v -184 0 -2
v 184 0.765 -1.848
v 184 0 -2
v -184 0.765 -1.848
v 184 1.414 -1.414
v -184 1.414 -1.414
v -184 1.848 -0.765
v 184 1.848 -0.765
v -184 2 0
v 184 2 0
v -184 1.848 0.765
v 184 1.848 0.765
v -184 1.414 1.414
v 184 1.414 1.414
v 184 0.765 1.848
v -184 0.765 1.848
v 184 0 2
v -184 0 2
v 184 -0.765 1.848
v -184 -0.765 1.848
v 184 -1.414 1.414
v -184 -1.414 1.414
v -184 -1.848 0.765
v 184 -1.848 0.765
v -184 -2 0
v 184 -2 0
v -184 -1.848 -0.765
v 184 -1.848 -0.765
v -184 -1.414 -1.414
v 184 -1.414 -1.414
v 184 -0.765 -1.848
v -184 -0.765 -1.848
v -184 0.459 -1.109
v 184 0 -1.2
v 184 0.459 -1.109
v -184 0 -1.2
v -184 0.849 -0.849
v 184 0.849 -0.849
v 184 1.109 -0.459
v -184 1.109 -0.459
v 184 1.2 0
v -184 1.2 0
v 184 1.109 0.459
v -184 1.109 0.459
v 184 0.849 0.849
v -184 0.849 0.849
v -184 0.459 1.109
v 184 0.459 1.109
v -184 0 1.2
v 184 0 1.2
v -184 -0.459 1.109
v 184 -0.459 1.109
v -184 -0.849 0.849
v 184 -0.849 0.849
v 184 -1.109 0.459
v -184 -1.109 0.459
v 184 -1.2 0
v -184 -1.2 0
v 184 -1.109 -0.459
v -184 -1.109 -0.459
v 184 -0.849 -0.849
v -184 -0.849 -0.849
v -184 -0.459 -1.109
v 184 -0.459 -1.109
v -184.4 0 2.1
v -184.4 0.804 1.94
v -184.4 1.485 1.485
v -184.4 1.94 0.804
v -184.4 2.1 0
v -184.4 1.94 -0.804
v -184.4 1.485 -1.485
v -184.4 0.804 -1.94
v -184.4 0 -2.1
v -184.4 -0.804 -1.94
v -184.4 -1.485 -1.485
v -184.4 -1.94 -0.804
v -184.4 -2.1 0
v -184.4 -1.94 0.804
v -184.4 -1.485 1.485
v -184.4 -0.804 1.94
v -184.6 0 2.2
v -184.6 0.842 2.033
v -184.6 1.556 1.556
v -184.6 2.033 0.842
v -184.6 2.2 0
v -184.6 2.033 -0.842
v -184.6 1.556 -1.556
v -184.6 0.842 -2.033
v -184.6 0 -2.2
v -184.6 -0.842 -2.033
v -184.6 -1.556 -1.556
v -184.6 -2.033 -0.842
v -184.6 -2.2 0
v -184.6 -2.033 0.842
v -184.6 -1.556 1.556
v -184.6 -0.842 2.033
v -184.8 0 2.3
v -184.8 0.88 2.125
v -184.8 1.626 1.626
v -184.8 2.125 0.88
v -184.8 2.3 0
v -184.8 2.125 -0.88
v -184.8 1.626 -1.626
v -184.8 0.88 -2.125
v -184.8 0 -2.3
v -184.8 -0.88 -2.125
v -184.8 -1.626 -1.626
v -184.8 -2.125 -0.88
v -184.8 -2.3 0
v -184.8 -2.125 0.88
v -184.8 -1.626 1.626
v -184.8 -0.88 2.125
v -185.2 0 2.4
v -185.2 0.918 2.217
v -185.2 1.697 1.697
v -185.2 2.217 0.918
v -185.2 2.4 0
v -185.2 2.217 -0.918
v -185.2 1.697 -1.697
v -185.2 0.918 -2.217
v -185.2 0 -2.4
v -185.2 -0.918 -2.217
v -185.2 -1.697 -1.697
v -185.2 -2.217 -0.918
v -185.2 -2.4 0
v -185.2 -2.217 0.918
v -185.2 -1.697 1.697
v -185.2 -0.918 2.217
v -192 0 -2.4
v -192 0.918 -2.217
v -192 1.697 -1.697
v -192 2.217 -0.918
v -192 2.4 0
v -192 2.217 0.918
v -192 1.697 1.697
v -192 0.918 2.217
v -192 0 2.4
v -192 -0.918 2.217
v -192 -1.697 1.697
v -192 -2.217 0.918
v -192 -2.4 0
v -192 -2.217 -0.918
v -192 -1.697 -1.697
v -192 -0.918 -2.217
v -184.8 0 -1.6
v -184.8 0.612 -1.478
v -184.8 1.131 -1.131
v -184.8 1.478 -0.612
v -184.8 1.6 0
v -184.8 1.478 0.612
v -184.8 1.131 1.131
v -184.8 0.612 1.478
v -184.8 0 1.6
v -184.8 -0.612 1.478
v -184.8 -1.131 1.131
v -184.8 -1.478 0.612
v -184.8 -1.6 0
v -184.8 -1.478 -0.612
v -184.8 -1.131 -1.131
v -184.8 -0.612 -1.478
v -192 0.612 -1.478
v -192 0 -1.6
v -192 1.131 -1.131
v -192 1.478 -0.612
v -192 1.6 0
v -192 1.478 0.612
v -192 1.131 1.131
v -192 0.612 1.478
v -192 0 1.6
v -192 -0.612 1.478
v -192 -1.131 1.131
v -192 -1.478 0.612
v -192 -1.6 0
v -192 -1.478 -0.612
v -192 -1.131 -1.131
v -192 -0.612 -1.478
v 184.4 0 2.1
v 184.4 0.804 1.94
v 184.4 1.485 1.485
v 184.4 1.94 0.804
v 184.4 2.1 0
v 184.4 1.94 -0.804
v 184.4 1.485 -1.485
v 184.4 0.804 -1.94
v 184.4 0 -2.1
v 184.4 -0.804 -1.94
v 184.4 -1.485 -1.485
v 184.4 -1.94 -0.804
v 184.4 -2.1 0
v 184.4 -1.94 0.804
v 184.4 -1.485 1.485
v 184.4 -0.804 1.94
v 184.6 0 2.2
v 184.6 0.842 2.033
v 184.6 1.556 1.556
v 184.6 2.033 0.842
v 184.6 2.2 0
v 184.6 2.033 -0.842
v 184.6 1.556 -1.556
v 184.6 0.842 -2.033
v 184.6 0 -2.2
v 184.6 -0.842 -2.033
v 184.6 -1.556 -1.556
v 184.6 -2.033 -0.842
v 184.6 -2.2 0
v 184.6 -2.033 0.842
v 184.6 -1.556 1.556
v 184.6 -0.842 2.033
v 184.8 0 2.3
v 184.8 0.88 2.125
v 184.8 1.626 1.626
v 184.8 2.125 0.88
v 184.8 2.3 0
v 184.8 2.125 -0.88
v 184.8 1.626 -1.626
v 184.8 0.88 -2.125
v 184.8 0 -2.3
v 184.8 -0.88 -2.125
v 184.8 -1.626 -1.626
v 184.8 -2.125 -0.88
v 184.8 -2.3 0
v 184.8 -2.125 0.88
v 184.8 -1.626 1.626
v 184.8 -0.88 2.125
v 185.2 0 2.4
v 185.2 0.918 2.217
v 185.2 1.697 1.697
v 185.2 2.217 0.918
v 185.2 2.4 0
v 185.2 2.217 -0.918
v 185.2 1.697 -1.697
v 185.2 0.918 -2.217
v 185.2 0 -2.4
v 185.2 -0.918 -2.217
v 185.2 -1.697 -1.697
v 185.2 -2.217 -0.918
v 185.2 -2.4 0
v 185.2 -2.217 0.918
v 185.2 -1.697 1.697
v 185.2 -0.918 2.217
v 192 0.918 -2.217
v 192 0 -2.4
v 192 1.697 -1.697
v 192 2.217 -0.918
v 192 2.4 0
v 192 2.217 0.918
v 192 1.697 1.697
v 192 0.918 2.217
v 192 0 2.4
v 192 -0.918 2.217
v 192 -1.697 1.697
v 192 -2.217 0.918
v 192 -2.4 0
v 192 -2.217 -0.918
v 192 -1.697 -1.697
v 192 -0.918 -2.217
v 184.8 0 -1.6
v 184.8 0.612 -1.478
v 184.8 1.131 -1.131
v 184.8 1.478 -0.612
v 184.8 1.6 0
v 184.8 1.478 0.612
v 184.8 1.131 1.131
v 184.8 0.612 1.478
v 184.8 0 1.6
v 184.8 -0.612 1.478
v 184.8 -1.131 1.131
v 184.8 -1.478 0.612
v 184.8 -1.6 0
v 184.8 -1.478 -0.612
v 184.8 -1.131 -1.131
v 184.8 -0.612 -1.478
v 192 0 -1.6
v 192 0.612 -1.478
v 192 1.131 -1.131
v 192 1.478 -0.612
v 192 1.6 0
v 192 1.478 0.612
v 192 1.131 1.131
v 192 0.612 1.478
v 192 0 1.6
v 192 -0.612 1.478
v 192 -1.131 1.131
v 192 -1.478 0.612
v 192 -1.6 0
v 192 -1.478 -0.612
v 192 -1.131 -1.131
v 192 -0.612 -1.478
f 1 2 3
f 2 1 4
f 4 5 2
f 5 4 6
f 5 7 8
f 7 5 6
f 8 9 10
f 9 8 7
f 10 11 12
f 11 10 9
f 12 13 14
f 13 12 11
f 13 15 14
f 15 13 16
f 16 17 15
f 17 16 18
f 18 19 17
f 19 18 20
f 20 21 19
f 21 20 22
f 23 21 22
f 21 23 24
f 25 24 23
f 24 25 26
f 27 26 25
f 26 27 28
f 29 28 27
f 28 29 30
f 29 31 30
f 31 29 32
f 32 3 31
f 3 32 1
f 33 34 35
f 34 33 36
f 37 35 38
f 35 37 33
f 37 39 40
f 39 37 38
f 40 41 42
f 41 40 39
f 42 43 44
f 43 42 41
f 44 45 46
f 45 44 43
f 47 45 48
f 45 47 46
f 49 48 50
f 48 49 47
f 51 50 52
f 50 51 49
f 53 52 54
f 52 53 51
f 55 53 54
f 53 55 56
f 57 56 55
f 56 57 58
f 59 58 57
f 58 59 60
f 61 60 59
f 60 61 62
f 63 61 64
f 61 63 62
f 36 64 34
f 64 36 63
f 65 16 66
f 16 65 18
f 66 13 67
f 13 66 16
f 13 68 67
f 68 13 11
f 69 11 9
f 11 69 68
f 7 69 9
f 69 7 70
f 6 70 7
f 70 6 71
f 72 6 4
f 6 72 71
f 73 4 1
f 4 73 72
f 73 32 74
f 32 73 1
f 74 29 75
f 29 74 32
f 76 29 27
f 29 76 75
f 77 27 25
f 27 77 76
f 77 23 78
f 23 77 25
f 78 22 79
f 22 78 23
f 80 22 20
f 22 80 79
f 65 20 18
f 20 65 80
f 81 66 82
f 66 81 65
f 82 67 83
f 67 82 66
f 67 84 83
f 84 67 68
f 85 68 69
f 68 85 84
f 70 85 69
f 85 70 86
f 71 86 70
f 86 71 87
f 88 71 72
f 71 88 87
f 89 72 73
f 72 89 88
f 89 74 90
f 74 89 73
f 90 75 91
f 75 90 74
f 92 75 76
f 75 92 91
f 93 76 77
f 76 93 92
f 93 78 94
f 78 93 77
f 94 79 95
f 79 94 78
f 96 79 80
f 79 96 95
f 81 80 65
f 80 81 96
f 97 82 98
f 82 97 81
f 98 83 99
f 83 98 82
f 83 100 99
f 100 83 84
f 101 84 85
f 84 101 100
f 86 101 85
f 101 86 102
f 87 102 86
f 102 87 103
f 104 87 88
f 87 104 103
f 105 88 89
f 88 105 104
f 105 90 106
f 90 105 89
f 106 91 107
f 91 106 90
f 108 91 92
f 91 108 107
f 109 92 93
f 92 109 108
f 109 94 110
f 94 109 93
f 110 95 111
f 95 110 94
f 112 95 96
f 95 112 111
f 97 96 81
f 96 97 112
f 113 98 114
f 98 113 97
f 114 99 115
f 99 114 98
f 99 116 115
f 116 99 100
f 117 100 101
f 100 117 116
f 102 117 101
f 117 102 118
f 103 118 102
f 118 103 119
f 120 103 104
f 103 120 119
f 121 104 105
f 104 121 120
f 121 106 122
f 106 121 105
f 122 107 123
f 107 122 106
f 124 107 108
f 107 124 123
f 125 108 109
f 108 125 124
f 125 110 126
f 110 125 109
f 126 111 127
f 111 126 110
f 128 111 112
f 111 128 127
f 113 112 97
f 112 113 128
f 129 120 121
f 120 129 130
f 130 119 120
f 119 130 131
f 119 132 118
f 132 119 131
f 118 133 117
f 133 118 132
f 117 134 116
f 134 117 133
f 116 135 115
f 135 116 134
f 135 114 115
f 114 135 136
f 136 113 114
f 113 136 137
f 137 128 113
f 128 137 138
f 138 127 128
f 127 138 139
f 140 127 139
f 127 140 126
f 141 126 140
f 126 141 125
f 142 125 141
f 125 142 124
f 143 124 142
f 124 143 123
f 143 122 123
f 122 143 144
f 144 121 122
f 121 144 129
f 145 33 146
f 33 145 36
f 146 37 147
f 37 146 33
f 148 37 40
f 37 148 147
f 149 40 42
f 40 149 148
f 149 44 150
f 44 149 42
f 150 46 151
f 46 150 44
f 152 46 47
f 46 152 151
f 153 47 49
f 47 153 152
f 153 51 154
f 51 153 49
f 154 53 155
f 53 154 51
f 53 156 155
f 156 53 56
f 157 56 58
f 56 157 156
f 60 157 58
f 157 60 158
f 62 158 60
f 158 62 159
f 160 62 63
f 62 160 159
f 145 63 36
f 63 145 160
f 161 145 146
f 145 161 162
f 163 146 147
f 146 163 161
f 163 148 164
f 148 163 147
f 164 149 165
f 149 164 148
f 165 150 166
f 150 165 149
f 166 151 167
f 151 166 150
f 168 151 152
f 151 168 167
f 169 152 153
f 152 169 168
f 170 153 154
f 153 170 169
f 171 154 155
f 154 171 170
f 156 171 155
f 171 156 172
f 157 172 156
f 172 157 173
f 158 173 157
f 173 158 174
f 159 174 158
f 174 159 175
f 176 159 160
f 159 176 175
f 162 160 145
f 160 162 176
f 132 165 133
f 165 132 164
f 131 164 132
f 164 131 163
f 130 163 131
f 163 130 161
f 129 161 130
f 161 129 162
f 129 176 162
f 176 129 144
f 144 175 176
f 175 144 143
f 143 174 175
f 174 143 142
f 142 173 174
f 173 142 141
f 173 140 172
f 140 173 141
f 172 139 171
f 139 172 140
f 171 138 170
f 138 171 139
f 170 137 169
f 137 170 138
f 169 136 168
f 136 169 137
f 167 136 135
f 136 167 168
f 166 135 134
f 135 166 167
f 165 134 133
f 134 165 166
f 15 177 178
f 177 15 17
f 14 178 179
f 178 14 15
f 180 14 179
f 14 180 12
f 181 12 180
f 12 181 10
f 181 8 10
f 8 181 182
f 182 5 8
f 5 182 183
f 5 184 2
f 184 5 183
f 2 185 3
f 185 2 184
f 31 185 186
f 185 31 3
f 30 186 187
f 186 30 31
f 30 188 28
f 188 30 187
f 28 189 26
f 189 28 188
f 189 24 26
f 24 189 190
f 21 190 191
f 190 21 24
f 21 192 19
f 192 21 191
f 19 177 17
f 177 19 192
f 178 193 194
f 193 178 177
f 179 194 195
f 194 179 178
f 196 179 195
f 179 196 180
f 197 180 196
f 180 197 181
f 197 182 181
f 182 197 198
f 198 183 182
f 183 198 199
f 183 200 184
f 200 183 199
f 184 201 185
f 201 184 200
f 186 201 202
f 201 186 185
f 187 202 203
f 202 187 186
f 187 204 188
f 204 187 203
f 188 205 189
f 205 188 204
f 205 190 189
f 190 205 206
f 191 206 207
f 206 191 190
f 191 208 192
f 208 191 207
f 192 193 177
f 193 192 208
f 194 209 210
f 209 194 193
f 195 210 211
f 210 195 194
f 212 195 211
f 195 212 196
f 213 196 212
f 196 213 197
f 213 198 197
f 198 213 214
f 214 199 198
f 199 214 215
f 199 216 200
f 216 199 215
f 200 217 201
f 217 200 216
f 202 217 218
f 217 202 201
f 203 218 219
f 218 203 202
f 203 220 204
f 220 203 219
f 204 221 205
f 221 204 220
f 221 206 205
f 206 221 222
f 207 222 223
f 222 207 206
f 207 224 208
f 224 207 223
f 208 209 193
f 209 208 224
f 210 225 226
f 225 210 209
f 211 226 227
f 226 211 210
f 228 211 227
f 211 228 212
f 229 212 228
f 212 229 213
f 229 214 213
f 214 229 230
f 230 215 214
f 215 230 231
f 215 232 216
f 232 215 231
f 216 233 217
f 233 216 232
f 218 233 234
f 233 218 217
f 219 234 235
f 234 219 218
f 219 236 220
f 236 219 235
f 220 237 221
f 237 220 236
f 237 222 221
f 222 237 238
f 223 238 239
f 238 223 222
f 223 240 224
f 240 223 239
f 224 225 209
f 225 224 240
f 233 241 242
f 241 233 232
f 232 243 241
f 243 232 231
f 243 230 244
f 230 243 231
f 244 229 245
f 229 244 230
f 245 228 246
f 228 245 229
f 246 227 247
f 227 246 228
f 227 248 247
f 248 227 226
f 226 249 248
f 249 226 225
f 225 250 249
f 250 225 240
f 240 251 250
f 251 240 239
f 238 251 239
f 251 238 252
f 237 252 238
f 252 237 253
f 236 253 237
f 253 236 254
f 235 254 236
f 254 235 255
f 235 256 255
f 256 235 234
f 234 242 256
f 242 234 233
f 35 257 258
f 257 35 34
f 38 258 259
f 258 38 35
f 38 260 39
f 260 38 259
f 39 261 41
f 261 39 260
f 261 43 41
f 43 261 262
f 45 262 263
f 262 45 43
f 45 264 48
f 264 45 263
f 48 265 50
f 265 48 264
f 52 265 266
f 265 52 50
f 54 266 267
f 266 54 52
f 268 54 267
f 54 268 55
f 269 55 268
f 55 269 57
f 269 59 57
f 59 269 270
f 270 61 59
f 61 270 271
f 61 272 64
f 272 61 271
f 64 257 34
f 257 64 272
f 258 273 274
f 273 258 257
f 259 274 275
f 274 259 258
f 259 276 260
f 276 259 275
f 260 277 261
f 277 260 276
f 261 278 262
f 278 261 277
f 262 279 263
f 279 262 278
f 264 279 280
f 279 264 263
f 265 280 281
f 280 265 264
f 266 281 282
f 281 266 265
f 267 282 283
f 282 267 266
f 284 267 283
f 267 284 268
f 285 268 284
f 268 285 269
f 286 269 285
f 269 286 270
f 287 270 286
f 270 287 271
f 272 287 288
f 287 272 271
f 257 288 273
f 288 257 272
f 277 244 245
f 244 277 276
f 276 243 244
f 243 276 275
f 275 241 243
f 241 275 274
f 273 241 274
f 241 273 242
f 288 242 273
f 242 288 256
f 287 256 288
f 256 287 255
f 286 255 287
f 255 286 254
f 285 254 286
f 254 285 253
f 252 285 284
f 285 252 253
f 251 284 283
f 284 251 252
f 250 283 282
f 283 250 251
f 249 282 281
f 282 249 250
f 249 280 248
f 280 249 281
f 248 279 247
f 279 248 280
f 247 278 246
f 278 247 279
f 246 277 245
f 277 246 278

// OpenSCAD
use <../lib.scad>
use <71533k01.scad>
use <71533k03.scad>
$fa=1; $fs=0.2;
function ldraw_lib__26439_f2(realsolid=false) = [
// 0 Technic Pneumatic Tube 48L with End Bulges
// 0 Name: 26439-f2.dat
// 0 Author: Philippe Hurbain [Philo]
// 0 !LDRAW_ORG Part UPDATE 2020-01
// 0 !LICENSE Licensed under CC BY 2.0 and CC BY 4.0 : see CAreadme.txt
// 
// 0 BFC CERTIFY CCW
  [0,"BFC","CERTIFY"],
  [0,"BFC","CCW"],
// 
// 0 !KEYWORDS 384 mm
// 
// 0 !HISTORY 2020-06-28 [PTadmin] Official Update 2020-01
// 
// 
// 1 16 -460 0 0 0 920 0 1 0 0 0 0 1 71533k03.dat
  [1,16,-460,0,0,0,920,0,1,0,0,0,0,1, ldraw_lib__71533k03(realsolid)],
// 1 16 -460 0 0 0 -1 0 1 0 0 0 0 1 71533k01.dat
  [1,16,-460,0,0,0,-1,0,1,0,0,0,0,1, ldraw_lib__71533k01(realsolid)],
// 1 16 460 0 0 0 1 0 1 0 0 0 0 1 71533k01.dat
  [1,16,460,0,0,0,1,0,1,0,0,0,0,1, ldraw_lib__71533k01(realsolid)],
];
module ldraw_lib__26439_f2(step=0, col=false, unit=2/5, alt=false, line=0.2, solid=!$preview)
    makepoly(ldraw_lib__26439_f2(solid), step=step, col=col, unit=unit, alt=alt, line=line, solid=solid);
ldraw_lib__26439_f2(line=0.2);
